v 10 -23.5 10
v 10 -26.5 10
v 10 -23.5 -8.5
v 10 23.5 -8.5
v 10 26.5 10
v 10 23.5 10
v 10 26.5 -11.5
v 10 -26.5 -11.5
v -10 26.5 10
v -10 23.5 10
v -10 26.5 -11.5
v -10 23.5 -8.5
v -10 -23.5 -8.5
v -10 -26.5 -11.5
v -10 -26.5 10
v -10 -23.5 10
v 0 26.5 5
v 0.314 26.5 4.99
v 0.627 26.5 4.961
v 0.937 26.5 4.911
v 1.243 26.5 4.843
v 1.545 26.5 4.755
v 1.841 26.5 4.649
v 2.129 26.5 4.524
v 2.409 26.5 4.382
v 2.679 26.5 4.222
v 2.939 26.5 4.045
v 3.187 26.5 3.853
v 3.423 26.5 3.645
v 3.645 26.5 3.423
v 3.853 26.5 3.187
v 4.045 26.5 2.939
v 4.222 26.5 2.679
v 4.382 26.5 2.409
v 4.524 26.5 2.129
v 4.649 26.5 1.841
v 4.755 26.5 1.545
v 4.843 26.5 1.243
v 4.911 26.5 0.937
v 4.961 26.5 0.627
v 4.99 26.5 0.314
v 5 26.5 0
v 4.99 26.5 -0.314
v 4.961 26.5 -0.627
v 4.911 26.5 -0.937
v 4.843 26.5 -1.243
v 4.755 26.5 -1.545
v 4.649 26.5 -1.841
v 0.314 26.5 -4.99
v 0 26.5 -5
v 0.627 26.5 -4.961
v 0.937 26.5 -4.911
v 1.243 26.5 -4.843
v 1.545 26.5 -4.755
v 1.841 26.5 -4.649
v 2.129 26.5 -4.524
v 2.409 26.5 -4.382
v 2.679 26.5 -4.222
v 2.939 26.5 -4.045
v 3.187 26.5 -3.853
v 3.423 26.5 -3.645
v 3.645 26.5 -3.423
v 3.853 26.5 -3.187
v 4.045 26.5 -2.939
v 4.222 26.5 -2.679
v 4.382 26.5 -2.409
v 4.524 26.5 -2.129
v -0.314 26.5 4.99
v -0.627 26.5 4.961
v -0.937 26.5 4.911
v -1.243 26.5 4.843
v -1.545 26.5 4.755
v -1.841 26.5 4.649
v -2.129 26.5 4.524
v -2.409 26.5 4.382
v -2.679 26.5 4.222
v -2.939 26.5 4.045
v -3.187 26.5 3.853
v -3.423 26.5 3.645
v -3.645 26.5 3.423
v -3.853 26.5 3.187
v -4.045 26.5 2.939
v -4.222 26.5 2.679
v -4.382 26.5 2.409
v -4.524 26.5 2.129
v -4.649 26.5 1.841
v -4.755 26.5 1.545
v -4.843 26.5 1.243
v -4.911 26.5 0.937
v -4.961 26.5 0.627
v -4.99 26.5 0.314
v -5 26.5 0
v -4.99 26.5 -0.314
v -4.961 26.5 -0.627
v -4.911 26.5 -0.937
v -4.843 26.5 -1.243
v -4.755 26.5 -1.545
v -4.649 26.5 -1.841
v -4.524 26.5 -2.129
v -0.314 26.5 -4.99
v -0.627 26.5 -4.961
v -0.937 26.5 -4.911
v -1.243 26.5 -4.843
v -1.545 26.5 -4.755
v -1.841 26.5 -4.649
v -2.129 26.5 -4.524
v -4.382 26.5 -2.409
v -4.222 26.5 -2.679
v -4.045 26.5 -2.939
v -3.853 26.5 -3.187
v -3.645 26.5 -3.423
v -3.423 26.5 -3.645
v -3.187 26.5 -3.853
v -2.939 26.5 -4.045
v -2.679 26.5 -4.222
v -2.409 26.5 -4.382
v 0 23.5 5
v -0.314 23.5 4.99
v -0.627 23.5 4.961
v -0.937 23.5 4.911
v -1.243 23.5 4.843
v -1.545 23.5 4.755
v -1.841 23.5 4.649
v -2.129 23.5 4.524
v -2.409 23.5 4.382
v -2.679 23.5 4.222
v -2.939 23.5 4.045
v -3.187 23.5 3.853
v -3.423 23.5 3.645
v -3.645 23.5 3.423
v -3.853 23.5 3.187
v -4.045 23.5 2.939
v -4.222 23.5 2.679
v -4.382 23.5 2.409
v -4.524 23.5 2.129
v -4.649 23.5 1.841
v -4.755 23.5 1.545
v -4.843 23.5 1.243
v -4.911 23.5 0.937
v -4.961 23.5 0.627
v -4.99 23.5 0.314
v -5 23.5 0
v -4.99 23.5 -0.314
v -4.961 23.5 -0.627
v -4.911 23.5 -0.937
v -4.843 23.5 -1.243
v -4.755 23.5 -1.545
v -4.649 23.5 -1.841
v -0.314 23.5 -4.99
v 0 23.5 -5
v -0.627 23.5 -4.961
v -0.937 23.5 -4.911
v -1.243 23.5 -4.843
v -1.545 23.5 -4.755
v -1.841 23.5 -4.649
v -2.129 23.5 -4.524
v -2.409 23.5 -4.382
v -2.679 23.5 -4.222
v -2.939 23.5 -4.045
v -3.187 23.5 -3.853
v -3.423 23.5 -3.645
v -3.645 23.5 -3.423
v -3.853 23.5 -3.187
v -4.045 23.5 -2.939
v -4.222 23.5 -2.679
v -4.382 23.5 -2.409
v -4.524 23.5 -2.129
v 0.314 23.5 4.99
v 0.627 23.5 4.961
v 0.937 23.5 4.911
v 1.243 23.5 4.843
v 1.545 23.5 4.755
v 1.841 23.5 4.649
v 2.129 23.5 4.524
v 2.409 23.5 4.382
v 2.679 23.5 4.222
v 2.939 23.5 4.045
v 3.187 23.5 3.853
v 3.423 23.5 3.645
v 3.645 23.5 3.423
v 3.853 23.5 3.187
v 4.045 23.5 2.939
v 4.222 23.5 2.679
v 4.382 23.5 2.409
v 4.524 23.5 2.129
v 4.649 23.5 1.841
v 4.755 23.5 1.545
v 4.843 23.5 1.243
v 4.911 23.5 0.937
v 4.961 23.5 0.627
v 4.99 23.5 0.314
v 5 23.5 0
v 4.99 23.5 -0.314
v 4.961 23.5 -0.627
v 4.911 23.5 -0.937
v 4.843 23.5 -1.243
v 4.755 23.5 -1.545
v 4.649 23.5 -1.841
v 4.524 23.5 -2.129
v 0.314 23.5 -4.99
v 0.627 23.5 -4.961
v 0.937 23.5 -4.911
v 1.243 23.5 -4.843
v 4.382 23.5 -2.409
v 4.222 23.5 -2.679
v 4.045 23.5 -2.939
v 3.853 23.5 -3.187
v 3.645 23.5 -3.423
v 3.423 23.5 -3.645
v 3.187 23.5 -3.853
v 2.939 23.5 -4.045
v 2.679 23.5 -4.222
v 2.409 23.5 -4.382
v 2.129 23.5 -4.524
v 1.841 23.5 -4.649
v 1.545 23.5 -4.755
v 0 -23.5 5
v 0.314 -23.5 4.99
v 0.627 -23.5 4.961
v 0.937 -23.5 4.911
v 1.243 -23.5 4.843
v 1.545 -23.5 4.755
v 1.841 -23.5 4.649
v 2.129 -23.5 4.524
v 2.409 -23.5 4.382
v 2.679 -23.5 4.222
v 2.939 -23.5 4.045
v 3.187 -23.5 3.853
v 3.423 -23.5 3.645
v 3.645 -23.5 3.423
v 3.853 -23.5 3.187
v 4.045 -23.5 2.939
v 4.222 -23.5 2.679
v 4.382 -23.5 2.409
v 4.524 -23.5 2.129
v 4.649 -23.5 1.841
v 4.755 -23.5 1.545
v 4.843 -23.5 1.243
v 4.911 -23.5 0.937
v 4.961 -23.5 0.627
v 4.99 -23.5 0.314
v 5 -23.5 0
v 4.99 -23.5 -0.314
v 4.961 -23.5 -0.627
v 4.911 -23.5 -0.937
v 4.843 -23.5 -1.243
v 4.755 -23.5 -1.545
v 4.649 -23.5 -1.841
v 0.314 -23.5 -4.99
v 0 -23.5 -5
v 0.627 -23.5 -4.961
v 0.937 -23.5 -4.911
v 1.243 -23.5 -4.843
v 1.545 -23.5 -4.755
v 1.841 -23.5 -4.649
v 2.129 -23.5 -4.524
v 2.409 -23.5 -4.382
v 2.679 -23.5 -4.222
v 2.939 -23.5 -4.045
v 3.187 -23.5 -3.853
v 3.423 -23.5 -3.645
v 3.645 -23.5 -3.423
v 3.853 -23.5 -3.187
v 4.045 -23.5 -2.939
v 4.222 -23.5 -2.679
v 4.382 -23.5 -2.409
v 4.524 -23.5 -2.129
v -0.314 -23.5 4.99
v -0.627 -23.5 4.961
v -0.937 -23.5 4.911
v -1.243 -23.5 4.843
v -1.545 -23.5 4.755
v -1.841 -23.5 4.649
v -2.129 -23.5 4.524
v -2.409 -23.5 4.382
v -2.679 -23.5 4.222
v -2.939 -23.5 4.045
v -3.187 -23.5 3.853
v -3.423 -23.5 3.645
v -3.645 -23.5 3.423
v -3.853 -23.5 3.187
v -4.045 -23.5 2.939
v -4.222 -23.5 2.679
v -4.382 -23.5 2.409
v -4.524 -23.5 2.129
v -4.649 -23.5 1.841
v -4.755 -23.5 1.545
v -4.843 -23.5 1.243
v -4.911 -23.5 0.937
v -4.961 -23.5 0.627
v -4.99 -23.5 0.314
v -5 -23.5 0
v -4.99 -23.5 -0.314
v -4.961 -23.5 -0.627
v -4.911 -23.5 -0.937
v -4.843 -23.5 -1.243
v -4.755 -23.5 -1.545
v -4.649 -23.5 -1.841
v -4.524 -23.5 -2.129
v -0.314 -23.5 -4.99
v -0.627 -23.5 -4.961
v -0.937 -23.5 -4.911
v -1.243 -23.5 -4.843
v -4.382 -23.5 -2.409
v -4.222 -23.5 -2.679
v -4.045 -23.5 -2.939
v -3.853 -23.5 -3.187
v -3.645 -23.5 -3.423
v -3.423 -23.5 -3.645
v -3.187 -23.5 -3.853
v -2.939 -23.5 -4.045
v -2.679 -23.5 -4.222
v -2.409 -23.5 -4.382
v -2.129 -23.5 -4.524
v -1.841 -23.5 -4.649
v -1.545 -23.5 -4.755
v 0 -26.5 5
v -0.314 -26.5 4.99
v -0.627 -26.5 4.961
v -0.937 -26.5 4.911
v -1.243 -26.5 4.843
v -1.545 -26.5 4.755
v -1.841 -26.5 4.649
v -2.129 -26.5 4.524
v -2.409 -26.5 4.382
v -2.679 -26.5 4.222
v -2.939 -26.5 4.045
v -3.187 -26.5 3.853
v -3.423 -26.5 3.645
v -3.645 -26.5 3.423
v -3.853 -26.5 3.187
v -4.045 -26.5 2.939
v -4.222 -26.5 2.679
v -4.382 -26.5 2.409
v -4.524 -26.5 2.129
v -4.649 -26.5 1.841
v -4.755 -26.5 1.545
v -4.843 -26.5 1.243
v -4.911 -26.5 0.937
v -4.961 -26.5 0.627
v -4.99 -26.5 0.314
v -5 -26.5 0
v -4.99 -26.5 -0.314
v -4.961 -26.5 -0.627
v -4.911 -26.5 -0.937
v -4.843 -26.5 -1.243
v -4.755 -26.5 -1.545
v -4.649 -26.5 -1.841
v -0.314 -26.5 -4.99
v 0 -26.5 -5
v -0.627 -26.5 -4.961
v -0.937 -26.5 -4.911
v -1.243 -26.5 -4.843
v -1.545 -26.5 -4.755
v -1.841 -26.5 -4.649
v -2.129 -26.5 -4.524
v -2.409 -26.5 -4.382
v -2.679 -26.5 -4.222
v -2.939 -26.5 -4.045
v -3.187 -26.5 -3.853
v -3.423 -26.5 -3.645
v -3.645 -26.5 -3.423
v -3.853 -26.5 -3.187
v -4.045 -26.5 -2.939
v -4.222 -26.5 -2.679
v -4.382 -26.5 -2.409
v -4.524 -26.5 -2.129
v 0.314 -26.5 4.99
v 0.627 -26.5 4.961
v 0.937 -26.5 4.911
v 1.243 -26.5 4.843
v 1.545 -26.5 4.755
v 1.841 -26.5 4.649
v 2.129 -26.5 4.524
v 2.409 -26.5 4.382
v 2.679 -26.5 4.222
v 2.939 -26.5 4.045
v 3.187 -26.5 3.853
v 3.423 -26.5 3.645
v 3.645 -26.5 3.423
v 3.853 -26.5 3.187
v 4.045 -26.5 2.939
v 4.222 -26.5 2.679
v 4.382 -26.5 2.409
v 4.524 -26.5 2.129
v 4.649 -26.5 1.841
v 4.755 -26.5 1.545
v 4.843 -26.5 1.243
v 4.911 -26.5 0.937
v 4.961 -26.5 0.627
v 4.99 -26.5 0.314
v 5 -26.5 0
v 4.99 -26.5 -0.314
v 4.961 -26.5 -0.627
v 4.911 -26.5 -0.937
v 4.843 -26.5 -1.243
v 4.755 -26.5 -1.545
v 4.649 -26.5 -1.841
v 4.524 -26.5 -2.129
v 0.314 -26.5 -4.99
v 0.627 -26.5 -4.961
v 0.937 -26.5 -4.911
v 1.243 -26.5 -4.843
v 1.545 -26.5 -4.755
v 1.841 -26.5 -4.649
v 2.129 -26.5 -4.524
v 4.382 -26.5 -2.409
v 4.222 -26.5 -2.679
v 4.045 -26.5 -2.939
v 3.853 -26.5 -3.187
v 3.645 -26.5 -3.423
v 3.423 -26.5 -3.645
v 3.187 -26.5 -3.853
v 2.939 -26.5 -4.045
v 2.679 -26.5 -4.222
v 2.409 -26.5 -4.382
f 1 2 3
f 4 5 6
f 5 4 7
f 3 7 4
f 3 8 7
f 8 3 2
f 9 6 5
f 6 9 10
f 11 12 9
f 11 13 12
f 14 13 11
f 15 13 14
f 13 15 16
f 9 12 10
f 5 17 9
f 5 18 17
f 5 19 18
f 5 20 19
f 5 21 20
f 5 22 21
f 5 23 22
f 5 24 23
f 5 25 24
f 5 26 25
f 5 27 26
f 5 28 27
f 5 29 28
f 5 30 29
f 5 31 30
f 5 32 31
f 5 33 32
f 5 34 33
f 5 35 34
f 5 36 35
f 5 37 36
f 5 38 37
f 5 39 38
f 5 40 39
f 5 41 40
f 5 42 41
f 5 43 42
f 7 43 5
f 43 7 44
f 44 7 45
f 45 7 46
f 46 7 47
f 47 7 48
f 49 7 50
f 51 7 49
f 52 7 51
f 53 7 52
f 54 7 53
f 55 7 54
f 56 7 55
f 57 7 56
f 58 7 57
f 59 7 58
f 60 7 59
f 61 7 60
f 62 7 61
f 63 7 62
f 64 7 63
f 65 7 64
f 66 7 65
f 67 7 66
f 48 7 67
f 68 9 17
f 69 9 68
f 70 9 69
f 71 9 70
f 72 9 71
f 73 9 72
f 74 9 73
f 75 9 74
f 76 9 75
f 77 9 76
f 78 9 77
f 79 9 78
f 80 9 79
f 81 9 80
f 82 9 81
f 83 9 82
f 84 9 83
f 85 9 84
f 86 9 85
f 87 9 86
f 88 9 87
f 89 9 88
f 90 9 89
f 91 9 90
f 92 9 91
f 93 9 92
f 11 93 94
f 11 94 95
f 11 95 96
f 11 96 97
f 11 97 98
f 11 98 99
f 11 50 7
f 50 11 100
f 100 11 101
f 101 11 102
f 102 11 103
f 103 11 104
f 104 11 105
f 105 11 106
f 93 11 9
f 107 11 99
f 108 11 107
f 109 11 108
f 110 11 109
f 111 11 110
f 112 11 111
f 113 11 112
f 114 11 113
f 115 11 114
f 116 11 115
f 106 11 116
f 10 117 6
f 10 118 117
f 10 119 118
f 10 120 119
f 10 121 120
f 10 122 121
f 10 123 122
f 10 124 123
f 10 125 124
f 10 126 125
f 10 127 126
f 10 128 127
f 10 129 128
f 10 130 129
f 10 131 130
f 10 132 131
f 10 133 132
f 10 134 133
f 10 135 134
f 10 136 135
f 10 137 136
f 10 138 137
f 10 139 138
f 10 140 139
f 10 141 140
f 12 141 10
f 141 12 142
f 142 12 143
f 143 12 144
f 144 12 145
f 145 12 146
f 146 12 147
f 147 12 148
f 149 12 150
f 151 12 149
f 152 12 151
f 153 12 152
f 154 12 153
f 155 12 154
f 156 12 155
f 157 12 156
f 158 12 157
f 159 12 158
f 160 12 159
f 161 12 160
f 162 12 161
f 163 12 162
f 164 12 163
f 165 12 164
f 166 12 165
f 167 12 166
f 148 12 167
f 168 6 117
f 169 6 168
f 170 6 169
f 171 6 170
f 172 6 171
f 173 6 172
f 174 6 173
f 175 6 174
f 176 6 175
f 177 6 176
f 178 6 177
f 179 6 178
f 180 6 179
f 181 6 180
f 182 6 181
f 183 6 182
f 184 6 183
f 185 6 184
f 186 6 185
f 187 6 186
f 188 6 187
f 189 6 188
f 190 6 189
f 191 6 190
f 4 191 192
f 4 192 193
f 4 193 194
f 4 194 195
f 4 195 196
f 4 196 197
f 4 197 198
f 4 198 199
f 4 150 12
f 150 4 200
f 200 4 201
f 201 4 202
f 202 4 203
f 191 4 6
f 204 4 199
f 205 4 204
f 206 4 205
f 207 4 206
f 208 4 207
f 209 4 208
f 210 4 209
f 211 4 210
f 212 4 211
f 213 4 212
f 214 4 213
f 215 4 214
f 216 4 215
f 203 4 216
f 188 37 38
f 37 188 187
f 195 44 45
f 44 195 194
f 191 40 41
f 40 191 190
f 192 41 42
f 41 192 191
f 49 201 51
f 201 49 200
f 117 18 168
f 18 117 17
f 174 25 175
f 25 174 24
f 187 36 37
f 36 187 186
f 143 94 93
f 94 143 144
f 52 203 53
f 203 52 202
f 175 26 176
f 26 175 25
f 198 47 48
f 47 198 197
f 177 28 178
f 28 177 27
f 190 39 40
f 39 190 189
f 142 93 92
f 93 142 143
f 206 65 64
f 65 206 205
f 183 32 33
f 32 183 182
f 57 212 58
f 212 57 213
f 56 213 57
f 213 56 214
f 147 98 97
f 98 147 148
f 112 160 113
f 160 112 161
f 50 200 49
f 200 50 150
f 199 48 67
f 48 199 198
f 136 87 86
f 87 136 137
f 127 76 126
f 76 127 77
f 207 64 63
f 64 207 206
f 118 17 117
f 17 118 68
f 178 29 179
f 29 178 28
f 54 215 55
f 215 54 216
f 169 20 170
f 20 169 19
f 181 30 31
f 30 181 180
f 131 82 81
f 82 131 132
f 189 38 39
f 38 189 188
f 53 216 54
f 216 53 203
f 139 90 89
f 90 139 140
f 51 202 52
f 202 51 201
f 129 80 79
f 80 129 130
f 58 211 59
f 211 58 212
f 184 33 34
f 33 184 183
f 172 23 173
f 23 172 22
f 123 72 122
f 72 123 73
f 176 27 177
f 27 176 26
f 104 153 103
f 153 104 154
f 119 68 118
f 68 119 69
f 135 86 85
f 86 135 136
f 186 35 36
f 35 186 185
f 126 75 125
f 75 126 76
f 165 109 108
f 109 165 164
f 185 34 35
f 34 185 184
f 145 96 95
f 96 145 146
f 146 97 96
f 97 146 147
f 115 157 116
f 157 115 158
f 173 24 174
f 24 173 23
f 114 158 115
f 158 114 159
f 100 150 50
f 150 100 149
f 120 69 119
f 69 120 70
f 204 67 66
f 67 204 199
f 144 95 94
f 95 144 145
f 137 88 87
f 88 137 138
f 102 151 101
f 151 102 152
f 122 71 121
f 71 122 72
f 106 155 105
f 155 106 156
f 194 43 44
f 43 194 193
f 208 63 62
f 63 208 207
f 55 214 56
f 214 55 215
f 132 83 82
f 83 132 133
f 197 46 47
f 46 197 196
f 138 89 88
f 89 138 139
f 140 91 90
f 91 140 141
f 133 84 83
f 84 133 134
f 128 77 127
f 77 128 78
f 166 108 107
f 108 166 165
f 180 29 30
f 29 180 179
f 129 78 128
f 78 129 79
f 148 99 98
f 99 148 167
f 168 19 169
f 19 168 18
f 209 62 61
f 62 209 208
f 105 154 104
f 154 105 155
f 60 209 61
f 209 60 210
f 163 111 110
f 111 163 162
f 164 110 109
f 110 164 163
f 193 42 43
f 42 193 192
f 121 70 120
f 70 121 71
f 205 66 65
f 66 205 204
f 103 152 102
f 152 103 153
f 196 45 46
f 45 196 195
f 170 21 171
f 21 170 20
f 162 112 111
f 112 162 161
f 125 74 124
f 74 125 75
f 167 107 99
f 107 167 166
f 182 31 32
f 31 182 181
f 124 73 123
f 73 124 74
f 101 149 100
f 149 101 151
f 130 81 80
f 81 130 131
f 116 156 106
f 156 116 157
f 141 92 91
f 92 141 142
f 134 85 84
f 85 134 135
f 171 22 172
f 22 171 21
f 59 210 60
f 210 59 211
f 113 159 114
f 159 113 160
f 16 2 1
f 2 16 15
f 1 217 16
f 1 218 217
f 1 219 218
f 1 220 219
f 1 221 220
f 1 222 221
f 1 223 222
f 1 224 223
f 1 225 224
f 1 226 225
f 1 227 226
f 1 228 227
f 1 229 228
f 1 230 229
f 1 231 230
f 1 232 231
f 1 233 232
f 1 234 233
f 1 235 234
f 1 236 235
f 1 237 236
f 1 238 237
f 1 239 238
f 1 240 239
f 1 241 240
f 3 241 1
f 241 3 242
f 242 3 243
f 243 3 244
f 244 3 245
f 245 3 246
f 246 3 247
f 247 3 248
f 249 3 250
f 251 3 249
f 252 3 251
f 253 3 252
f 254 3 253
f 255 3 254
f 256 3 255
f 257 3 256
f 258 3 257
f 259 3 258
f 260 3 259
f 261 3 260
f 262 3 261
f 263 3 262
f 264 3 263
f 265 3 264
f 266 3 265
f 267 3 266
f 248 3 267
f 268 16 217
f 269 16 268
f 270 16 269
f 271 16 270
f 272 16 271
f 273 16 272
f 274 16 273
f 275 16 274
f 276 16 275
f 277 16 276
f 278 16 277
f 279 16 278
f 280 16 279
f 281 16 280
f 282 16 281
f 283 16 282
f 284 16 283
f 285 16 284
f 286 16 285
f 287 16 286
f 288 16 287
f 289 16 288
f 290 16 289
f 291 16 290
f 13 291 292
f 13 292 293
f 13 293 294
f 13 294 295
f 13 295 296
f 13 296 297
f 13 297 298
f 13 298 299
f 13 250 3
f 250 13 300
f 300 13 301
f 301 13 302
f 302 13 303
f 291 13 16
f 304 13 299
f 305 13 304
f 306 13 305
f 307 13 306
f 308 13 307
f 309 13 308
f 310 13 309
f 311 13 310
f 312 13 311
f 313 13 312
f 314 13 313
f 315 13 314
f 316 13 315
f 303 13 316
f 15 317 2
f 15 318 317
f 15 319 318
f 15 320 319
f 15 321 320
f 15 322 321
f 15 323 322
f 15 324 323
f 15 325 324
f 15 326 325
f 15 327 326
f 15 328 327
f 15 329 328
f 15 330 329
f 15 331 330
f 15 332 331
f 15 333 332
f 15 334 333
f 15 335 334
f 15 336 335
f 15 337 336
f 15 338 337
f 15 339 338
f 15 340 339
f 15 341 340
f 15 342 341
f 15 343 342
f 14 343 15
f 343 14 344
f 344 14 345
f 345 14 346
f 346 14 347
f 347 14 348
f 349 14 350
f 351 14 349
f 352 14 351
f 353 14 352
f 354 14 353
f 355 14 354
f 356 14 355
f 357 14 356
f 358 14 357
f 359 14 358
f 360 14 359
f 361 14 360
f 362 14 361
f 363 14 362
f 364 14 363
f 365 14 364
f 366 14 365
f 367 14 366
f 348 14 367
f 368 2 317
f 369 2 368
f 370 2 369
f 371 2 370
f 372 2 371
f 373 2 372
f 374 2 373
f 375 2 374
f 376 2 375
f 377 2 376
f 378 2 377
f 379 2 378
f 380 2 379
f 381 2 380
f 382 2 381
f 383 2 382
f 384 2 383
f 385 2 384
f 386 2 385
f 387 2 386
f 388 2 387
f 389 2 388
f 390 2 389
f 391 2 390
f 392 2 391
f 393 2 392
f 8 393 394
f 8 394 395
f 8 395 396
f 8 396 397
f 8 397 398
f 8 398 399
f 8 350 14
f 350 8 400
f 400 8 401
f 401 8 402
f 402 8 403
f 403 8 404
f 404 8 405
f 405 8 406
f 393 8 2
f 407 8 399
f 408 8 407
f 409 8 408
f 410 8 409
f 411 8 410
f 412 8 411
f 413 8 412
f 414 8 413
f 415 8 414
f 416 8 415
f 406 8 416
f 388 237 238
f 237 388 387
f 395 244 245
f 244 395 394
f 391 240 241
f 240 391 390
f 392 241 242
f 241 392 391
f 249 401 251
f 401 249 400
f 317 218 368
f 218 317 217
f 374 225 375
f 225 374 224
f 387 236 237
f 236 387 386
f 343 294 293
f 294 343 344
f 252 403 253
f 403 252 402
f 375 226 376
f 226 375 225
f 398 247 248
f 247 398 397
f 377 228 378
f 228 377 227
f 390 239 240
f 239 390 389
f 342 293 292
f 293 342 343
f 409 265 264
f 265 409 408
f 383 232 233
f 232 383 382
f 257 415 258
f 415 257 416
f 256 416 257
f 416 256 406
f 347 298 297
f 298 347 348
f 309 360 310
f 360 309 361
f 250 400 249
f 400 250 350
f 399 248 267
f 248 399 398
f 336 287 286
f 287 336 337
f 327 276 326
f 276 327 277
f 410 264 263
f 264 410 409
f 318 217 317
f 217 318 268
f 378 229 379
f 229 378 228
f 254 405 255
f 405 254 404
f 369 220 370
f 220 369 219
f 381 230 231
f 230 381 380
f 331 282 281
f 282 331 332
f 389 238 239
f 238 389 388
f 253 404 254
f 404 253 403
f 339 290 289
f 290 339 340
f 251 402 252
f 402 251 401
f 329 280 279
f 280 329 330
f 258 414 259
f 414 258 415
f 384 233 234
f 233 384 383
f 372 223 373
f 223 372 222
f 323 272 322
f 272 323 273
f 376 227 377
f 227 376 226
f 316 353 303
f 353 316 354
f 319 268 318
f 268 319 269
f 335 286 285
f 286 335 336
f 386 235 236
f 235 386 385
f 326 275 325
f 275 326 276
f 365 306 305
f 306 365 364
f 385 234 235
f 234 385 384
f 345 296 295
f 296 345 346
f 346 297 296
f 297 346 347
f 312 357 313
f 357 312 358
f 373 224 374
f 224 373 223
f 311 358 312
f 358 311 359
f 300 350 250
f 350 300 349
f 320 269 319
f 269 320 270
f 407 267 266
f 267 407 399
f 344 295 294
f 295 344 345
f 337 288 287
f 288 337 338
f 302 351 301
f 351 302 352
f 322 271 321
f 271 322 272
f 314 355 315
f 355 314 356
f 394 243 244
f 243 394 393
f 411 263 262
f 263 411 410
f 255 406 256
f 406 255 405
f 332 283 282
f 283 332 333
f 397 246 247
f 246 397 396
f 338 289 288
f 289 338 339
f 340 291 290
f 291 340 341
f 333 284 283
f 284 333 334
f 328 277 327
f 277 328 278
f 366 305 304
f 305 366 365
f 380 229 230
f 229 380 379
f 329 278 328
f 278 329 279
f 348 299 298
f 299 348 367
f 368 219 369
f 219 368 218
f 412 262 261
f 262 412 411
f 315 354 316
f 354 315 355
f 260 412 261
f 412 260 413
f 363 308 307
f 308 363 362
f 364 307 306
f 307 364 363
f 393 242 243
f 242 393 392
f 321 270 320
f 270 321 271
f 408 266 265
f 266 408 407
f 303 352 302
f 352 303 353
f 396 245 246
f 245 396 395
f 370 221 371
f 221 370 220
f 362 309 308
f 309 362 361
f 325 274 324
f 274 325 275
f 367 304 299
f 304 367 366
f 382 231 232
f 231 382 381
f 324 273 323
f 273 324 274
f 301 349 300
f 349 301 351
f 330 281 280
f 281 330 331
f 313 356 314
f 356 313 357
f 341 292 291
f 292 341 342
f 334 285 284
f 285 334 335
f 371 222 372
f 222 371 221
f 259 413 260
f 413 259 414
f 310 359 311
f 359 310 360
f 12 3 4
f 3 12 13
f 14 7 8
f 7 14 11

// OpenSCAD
$fn = 100;
larghezza = 50;
spessore = 3;
for (i = [larghezza/2,-larghezza/2]){
    translate([0,i,0]){
        difference() {
            cube ([20,spessore,20],true);
                rotate([90,0,0]){
                    #cylinder(5,5,5,true);
            }
        }
    }
}
translate([0,0,-10]){
    cube([20,larghezza+spessore,spessore],true);
}
